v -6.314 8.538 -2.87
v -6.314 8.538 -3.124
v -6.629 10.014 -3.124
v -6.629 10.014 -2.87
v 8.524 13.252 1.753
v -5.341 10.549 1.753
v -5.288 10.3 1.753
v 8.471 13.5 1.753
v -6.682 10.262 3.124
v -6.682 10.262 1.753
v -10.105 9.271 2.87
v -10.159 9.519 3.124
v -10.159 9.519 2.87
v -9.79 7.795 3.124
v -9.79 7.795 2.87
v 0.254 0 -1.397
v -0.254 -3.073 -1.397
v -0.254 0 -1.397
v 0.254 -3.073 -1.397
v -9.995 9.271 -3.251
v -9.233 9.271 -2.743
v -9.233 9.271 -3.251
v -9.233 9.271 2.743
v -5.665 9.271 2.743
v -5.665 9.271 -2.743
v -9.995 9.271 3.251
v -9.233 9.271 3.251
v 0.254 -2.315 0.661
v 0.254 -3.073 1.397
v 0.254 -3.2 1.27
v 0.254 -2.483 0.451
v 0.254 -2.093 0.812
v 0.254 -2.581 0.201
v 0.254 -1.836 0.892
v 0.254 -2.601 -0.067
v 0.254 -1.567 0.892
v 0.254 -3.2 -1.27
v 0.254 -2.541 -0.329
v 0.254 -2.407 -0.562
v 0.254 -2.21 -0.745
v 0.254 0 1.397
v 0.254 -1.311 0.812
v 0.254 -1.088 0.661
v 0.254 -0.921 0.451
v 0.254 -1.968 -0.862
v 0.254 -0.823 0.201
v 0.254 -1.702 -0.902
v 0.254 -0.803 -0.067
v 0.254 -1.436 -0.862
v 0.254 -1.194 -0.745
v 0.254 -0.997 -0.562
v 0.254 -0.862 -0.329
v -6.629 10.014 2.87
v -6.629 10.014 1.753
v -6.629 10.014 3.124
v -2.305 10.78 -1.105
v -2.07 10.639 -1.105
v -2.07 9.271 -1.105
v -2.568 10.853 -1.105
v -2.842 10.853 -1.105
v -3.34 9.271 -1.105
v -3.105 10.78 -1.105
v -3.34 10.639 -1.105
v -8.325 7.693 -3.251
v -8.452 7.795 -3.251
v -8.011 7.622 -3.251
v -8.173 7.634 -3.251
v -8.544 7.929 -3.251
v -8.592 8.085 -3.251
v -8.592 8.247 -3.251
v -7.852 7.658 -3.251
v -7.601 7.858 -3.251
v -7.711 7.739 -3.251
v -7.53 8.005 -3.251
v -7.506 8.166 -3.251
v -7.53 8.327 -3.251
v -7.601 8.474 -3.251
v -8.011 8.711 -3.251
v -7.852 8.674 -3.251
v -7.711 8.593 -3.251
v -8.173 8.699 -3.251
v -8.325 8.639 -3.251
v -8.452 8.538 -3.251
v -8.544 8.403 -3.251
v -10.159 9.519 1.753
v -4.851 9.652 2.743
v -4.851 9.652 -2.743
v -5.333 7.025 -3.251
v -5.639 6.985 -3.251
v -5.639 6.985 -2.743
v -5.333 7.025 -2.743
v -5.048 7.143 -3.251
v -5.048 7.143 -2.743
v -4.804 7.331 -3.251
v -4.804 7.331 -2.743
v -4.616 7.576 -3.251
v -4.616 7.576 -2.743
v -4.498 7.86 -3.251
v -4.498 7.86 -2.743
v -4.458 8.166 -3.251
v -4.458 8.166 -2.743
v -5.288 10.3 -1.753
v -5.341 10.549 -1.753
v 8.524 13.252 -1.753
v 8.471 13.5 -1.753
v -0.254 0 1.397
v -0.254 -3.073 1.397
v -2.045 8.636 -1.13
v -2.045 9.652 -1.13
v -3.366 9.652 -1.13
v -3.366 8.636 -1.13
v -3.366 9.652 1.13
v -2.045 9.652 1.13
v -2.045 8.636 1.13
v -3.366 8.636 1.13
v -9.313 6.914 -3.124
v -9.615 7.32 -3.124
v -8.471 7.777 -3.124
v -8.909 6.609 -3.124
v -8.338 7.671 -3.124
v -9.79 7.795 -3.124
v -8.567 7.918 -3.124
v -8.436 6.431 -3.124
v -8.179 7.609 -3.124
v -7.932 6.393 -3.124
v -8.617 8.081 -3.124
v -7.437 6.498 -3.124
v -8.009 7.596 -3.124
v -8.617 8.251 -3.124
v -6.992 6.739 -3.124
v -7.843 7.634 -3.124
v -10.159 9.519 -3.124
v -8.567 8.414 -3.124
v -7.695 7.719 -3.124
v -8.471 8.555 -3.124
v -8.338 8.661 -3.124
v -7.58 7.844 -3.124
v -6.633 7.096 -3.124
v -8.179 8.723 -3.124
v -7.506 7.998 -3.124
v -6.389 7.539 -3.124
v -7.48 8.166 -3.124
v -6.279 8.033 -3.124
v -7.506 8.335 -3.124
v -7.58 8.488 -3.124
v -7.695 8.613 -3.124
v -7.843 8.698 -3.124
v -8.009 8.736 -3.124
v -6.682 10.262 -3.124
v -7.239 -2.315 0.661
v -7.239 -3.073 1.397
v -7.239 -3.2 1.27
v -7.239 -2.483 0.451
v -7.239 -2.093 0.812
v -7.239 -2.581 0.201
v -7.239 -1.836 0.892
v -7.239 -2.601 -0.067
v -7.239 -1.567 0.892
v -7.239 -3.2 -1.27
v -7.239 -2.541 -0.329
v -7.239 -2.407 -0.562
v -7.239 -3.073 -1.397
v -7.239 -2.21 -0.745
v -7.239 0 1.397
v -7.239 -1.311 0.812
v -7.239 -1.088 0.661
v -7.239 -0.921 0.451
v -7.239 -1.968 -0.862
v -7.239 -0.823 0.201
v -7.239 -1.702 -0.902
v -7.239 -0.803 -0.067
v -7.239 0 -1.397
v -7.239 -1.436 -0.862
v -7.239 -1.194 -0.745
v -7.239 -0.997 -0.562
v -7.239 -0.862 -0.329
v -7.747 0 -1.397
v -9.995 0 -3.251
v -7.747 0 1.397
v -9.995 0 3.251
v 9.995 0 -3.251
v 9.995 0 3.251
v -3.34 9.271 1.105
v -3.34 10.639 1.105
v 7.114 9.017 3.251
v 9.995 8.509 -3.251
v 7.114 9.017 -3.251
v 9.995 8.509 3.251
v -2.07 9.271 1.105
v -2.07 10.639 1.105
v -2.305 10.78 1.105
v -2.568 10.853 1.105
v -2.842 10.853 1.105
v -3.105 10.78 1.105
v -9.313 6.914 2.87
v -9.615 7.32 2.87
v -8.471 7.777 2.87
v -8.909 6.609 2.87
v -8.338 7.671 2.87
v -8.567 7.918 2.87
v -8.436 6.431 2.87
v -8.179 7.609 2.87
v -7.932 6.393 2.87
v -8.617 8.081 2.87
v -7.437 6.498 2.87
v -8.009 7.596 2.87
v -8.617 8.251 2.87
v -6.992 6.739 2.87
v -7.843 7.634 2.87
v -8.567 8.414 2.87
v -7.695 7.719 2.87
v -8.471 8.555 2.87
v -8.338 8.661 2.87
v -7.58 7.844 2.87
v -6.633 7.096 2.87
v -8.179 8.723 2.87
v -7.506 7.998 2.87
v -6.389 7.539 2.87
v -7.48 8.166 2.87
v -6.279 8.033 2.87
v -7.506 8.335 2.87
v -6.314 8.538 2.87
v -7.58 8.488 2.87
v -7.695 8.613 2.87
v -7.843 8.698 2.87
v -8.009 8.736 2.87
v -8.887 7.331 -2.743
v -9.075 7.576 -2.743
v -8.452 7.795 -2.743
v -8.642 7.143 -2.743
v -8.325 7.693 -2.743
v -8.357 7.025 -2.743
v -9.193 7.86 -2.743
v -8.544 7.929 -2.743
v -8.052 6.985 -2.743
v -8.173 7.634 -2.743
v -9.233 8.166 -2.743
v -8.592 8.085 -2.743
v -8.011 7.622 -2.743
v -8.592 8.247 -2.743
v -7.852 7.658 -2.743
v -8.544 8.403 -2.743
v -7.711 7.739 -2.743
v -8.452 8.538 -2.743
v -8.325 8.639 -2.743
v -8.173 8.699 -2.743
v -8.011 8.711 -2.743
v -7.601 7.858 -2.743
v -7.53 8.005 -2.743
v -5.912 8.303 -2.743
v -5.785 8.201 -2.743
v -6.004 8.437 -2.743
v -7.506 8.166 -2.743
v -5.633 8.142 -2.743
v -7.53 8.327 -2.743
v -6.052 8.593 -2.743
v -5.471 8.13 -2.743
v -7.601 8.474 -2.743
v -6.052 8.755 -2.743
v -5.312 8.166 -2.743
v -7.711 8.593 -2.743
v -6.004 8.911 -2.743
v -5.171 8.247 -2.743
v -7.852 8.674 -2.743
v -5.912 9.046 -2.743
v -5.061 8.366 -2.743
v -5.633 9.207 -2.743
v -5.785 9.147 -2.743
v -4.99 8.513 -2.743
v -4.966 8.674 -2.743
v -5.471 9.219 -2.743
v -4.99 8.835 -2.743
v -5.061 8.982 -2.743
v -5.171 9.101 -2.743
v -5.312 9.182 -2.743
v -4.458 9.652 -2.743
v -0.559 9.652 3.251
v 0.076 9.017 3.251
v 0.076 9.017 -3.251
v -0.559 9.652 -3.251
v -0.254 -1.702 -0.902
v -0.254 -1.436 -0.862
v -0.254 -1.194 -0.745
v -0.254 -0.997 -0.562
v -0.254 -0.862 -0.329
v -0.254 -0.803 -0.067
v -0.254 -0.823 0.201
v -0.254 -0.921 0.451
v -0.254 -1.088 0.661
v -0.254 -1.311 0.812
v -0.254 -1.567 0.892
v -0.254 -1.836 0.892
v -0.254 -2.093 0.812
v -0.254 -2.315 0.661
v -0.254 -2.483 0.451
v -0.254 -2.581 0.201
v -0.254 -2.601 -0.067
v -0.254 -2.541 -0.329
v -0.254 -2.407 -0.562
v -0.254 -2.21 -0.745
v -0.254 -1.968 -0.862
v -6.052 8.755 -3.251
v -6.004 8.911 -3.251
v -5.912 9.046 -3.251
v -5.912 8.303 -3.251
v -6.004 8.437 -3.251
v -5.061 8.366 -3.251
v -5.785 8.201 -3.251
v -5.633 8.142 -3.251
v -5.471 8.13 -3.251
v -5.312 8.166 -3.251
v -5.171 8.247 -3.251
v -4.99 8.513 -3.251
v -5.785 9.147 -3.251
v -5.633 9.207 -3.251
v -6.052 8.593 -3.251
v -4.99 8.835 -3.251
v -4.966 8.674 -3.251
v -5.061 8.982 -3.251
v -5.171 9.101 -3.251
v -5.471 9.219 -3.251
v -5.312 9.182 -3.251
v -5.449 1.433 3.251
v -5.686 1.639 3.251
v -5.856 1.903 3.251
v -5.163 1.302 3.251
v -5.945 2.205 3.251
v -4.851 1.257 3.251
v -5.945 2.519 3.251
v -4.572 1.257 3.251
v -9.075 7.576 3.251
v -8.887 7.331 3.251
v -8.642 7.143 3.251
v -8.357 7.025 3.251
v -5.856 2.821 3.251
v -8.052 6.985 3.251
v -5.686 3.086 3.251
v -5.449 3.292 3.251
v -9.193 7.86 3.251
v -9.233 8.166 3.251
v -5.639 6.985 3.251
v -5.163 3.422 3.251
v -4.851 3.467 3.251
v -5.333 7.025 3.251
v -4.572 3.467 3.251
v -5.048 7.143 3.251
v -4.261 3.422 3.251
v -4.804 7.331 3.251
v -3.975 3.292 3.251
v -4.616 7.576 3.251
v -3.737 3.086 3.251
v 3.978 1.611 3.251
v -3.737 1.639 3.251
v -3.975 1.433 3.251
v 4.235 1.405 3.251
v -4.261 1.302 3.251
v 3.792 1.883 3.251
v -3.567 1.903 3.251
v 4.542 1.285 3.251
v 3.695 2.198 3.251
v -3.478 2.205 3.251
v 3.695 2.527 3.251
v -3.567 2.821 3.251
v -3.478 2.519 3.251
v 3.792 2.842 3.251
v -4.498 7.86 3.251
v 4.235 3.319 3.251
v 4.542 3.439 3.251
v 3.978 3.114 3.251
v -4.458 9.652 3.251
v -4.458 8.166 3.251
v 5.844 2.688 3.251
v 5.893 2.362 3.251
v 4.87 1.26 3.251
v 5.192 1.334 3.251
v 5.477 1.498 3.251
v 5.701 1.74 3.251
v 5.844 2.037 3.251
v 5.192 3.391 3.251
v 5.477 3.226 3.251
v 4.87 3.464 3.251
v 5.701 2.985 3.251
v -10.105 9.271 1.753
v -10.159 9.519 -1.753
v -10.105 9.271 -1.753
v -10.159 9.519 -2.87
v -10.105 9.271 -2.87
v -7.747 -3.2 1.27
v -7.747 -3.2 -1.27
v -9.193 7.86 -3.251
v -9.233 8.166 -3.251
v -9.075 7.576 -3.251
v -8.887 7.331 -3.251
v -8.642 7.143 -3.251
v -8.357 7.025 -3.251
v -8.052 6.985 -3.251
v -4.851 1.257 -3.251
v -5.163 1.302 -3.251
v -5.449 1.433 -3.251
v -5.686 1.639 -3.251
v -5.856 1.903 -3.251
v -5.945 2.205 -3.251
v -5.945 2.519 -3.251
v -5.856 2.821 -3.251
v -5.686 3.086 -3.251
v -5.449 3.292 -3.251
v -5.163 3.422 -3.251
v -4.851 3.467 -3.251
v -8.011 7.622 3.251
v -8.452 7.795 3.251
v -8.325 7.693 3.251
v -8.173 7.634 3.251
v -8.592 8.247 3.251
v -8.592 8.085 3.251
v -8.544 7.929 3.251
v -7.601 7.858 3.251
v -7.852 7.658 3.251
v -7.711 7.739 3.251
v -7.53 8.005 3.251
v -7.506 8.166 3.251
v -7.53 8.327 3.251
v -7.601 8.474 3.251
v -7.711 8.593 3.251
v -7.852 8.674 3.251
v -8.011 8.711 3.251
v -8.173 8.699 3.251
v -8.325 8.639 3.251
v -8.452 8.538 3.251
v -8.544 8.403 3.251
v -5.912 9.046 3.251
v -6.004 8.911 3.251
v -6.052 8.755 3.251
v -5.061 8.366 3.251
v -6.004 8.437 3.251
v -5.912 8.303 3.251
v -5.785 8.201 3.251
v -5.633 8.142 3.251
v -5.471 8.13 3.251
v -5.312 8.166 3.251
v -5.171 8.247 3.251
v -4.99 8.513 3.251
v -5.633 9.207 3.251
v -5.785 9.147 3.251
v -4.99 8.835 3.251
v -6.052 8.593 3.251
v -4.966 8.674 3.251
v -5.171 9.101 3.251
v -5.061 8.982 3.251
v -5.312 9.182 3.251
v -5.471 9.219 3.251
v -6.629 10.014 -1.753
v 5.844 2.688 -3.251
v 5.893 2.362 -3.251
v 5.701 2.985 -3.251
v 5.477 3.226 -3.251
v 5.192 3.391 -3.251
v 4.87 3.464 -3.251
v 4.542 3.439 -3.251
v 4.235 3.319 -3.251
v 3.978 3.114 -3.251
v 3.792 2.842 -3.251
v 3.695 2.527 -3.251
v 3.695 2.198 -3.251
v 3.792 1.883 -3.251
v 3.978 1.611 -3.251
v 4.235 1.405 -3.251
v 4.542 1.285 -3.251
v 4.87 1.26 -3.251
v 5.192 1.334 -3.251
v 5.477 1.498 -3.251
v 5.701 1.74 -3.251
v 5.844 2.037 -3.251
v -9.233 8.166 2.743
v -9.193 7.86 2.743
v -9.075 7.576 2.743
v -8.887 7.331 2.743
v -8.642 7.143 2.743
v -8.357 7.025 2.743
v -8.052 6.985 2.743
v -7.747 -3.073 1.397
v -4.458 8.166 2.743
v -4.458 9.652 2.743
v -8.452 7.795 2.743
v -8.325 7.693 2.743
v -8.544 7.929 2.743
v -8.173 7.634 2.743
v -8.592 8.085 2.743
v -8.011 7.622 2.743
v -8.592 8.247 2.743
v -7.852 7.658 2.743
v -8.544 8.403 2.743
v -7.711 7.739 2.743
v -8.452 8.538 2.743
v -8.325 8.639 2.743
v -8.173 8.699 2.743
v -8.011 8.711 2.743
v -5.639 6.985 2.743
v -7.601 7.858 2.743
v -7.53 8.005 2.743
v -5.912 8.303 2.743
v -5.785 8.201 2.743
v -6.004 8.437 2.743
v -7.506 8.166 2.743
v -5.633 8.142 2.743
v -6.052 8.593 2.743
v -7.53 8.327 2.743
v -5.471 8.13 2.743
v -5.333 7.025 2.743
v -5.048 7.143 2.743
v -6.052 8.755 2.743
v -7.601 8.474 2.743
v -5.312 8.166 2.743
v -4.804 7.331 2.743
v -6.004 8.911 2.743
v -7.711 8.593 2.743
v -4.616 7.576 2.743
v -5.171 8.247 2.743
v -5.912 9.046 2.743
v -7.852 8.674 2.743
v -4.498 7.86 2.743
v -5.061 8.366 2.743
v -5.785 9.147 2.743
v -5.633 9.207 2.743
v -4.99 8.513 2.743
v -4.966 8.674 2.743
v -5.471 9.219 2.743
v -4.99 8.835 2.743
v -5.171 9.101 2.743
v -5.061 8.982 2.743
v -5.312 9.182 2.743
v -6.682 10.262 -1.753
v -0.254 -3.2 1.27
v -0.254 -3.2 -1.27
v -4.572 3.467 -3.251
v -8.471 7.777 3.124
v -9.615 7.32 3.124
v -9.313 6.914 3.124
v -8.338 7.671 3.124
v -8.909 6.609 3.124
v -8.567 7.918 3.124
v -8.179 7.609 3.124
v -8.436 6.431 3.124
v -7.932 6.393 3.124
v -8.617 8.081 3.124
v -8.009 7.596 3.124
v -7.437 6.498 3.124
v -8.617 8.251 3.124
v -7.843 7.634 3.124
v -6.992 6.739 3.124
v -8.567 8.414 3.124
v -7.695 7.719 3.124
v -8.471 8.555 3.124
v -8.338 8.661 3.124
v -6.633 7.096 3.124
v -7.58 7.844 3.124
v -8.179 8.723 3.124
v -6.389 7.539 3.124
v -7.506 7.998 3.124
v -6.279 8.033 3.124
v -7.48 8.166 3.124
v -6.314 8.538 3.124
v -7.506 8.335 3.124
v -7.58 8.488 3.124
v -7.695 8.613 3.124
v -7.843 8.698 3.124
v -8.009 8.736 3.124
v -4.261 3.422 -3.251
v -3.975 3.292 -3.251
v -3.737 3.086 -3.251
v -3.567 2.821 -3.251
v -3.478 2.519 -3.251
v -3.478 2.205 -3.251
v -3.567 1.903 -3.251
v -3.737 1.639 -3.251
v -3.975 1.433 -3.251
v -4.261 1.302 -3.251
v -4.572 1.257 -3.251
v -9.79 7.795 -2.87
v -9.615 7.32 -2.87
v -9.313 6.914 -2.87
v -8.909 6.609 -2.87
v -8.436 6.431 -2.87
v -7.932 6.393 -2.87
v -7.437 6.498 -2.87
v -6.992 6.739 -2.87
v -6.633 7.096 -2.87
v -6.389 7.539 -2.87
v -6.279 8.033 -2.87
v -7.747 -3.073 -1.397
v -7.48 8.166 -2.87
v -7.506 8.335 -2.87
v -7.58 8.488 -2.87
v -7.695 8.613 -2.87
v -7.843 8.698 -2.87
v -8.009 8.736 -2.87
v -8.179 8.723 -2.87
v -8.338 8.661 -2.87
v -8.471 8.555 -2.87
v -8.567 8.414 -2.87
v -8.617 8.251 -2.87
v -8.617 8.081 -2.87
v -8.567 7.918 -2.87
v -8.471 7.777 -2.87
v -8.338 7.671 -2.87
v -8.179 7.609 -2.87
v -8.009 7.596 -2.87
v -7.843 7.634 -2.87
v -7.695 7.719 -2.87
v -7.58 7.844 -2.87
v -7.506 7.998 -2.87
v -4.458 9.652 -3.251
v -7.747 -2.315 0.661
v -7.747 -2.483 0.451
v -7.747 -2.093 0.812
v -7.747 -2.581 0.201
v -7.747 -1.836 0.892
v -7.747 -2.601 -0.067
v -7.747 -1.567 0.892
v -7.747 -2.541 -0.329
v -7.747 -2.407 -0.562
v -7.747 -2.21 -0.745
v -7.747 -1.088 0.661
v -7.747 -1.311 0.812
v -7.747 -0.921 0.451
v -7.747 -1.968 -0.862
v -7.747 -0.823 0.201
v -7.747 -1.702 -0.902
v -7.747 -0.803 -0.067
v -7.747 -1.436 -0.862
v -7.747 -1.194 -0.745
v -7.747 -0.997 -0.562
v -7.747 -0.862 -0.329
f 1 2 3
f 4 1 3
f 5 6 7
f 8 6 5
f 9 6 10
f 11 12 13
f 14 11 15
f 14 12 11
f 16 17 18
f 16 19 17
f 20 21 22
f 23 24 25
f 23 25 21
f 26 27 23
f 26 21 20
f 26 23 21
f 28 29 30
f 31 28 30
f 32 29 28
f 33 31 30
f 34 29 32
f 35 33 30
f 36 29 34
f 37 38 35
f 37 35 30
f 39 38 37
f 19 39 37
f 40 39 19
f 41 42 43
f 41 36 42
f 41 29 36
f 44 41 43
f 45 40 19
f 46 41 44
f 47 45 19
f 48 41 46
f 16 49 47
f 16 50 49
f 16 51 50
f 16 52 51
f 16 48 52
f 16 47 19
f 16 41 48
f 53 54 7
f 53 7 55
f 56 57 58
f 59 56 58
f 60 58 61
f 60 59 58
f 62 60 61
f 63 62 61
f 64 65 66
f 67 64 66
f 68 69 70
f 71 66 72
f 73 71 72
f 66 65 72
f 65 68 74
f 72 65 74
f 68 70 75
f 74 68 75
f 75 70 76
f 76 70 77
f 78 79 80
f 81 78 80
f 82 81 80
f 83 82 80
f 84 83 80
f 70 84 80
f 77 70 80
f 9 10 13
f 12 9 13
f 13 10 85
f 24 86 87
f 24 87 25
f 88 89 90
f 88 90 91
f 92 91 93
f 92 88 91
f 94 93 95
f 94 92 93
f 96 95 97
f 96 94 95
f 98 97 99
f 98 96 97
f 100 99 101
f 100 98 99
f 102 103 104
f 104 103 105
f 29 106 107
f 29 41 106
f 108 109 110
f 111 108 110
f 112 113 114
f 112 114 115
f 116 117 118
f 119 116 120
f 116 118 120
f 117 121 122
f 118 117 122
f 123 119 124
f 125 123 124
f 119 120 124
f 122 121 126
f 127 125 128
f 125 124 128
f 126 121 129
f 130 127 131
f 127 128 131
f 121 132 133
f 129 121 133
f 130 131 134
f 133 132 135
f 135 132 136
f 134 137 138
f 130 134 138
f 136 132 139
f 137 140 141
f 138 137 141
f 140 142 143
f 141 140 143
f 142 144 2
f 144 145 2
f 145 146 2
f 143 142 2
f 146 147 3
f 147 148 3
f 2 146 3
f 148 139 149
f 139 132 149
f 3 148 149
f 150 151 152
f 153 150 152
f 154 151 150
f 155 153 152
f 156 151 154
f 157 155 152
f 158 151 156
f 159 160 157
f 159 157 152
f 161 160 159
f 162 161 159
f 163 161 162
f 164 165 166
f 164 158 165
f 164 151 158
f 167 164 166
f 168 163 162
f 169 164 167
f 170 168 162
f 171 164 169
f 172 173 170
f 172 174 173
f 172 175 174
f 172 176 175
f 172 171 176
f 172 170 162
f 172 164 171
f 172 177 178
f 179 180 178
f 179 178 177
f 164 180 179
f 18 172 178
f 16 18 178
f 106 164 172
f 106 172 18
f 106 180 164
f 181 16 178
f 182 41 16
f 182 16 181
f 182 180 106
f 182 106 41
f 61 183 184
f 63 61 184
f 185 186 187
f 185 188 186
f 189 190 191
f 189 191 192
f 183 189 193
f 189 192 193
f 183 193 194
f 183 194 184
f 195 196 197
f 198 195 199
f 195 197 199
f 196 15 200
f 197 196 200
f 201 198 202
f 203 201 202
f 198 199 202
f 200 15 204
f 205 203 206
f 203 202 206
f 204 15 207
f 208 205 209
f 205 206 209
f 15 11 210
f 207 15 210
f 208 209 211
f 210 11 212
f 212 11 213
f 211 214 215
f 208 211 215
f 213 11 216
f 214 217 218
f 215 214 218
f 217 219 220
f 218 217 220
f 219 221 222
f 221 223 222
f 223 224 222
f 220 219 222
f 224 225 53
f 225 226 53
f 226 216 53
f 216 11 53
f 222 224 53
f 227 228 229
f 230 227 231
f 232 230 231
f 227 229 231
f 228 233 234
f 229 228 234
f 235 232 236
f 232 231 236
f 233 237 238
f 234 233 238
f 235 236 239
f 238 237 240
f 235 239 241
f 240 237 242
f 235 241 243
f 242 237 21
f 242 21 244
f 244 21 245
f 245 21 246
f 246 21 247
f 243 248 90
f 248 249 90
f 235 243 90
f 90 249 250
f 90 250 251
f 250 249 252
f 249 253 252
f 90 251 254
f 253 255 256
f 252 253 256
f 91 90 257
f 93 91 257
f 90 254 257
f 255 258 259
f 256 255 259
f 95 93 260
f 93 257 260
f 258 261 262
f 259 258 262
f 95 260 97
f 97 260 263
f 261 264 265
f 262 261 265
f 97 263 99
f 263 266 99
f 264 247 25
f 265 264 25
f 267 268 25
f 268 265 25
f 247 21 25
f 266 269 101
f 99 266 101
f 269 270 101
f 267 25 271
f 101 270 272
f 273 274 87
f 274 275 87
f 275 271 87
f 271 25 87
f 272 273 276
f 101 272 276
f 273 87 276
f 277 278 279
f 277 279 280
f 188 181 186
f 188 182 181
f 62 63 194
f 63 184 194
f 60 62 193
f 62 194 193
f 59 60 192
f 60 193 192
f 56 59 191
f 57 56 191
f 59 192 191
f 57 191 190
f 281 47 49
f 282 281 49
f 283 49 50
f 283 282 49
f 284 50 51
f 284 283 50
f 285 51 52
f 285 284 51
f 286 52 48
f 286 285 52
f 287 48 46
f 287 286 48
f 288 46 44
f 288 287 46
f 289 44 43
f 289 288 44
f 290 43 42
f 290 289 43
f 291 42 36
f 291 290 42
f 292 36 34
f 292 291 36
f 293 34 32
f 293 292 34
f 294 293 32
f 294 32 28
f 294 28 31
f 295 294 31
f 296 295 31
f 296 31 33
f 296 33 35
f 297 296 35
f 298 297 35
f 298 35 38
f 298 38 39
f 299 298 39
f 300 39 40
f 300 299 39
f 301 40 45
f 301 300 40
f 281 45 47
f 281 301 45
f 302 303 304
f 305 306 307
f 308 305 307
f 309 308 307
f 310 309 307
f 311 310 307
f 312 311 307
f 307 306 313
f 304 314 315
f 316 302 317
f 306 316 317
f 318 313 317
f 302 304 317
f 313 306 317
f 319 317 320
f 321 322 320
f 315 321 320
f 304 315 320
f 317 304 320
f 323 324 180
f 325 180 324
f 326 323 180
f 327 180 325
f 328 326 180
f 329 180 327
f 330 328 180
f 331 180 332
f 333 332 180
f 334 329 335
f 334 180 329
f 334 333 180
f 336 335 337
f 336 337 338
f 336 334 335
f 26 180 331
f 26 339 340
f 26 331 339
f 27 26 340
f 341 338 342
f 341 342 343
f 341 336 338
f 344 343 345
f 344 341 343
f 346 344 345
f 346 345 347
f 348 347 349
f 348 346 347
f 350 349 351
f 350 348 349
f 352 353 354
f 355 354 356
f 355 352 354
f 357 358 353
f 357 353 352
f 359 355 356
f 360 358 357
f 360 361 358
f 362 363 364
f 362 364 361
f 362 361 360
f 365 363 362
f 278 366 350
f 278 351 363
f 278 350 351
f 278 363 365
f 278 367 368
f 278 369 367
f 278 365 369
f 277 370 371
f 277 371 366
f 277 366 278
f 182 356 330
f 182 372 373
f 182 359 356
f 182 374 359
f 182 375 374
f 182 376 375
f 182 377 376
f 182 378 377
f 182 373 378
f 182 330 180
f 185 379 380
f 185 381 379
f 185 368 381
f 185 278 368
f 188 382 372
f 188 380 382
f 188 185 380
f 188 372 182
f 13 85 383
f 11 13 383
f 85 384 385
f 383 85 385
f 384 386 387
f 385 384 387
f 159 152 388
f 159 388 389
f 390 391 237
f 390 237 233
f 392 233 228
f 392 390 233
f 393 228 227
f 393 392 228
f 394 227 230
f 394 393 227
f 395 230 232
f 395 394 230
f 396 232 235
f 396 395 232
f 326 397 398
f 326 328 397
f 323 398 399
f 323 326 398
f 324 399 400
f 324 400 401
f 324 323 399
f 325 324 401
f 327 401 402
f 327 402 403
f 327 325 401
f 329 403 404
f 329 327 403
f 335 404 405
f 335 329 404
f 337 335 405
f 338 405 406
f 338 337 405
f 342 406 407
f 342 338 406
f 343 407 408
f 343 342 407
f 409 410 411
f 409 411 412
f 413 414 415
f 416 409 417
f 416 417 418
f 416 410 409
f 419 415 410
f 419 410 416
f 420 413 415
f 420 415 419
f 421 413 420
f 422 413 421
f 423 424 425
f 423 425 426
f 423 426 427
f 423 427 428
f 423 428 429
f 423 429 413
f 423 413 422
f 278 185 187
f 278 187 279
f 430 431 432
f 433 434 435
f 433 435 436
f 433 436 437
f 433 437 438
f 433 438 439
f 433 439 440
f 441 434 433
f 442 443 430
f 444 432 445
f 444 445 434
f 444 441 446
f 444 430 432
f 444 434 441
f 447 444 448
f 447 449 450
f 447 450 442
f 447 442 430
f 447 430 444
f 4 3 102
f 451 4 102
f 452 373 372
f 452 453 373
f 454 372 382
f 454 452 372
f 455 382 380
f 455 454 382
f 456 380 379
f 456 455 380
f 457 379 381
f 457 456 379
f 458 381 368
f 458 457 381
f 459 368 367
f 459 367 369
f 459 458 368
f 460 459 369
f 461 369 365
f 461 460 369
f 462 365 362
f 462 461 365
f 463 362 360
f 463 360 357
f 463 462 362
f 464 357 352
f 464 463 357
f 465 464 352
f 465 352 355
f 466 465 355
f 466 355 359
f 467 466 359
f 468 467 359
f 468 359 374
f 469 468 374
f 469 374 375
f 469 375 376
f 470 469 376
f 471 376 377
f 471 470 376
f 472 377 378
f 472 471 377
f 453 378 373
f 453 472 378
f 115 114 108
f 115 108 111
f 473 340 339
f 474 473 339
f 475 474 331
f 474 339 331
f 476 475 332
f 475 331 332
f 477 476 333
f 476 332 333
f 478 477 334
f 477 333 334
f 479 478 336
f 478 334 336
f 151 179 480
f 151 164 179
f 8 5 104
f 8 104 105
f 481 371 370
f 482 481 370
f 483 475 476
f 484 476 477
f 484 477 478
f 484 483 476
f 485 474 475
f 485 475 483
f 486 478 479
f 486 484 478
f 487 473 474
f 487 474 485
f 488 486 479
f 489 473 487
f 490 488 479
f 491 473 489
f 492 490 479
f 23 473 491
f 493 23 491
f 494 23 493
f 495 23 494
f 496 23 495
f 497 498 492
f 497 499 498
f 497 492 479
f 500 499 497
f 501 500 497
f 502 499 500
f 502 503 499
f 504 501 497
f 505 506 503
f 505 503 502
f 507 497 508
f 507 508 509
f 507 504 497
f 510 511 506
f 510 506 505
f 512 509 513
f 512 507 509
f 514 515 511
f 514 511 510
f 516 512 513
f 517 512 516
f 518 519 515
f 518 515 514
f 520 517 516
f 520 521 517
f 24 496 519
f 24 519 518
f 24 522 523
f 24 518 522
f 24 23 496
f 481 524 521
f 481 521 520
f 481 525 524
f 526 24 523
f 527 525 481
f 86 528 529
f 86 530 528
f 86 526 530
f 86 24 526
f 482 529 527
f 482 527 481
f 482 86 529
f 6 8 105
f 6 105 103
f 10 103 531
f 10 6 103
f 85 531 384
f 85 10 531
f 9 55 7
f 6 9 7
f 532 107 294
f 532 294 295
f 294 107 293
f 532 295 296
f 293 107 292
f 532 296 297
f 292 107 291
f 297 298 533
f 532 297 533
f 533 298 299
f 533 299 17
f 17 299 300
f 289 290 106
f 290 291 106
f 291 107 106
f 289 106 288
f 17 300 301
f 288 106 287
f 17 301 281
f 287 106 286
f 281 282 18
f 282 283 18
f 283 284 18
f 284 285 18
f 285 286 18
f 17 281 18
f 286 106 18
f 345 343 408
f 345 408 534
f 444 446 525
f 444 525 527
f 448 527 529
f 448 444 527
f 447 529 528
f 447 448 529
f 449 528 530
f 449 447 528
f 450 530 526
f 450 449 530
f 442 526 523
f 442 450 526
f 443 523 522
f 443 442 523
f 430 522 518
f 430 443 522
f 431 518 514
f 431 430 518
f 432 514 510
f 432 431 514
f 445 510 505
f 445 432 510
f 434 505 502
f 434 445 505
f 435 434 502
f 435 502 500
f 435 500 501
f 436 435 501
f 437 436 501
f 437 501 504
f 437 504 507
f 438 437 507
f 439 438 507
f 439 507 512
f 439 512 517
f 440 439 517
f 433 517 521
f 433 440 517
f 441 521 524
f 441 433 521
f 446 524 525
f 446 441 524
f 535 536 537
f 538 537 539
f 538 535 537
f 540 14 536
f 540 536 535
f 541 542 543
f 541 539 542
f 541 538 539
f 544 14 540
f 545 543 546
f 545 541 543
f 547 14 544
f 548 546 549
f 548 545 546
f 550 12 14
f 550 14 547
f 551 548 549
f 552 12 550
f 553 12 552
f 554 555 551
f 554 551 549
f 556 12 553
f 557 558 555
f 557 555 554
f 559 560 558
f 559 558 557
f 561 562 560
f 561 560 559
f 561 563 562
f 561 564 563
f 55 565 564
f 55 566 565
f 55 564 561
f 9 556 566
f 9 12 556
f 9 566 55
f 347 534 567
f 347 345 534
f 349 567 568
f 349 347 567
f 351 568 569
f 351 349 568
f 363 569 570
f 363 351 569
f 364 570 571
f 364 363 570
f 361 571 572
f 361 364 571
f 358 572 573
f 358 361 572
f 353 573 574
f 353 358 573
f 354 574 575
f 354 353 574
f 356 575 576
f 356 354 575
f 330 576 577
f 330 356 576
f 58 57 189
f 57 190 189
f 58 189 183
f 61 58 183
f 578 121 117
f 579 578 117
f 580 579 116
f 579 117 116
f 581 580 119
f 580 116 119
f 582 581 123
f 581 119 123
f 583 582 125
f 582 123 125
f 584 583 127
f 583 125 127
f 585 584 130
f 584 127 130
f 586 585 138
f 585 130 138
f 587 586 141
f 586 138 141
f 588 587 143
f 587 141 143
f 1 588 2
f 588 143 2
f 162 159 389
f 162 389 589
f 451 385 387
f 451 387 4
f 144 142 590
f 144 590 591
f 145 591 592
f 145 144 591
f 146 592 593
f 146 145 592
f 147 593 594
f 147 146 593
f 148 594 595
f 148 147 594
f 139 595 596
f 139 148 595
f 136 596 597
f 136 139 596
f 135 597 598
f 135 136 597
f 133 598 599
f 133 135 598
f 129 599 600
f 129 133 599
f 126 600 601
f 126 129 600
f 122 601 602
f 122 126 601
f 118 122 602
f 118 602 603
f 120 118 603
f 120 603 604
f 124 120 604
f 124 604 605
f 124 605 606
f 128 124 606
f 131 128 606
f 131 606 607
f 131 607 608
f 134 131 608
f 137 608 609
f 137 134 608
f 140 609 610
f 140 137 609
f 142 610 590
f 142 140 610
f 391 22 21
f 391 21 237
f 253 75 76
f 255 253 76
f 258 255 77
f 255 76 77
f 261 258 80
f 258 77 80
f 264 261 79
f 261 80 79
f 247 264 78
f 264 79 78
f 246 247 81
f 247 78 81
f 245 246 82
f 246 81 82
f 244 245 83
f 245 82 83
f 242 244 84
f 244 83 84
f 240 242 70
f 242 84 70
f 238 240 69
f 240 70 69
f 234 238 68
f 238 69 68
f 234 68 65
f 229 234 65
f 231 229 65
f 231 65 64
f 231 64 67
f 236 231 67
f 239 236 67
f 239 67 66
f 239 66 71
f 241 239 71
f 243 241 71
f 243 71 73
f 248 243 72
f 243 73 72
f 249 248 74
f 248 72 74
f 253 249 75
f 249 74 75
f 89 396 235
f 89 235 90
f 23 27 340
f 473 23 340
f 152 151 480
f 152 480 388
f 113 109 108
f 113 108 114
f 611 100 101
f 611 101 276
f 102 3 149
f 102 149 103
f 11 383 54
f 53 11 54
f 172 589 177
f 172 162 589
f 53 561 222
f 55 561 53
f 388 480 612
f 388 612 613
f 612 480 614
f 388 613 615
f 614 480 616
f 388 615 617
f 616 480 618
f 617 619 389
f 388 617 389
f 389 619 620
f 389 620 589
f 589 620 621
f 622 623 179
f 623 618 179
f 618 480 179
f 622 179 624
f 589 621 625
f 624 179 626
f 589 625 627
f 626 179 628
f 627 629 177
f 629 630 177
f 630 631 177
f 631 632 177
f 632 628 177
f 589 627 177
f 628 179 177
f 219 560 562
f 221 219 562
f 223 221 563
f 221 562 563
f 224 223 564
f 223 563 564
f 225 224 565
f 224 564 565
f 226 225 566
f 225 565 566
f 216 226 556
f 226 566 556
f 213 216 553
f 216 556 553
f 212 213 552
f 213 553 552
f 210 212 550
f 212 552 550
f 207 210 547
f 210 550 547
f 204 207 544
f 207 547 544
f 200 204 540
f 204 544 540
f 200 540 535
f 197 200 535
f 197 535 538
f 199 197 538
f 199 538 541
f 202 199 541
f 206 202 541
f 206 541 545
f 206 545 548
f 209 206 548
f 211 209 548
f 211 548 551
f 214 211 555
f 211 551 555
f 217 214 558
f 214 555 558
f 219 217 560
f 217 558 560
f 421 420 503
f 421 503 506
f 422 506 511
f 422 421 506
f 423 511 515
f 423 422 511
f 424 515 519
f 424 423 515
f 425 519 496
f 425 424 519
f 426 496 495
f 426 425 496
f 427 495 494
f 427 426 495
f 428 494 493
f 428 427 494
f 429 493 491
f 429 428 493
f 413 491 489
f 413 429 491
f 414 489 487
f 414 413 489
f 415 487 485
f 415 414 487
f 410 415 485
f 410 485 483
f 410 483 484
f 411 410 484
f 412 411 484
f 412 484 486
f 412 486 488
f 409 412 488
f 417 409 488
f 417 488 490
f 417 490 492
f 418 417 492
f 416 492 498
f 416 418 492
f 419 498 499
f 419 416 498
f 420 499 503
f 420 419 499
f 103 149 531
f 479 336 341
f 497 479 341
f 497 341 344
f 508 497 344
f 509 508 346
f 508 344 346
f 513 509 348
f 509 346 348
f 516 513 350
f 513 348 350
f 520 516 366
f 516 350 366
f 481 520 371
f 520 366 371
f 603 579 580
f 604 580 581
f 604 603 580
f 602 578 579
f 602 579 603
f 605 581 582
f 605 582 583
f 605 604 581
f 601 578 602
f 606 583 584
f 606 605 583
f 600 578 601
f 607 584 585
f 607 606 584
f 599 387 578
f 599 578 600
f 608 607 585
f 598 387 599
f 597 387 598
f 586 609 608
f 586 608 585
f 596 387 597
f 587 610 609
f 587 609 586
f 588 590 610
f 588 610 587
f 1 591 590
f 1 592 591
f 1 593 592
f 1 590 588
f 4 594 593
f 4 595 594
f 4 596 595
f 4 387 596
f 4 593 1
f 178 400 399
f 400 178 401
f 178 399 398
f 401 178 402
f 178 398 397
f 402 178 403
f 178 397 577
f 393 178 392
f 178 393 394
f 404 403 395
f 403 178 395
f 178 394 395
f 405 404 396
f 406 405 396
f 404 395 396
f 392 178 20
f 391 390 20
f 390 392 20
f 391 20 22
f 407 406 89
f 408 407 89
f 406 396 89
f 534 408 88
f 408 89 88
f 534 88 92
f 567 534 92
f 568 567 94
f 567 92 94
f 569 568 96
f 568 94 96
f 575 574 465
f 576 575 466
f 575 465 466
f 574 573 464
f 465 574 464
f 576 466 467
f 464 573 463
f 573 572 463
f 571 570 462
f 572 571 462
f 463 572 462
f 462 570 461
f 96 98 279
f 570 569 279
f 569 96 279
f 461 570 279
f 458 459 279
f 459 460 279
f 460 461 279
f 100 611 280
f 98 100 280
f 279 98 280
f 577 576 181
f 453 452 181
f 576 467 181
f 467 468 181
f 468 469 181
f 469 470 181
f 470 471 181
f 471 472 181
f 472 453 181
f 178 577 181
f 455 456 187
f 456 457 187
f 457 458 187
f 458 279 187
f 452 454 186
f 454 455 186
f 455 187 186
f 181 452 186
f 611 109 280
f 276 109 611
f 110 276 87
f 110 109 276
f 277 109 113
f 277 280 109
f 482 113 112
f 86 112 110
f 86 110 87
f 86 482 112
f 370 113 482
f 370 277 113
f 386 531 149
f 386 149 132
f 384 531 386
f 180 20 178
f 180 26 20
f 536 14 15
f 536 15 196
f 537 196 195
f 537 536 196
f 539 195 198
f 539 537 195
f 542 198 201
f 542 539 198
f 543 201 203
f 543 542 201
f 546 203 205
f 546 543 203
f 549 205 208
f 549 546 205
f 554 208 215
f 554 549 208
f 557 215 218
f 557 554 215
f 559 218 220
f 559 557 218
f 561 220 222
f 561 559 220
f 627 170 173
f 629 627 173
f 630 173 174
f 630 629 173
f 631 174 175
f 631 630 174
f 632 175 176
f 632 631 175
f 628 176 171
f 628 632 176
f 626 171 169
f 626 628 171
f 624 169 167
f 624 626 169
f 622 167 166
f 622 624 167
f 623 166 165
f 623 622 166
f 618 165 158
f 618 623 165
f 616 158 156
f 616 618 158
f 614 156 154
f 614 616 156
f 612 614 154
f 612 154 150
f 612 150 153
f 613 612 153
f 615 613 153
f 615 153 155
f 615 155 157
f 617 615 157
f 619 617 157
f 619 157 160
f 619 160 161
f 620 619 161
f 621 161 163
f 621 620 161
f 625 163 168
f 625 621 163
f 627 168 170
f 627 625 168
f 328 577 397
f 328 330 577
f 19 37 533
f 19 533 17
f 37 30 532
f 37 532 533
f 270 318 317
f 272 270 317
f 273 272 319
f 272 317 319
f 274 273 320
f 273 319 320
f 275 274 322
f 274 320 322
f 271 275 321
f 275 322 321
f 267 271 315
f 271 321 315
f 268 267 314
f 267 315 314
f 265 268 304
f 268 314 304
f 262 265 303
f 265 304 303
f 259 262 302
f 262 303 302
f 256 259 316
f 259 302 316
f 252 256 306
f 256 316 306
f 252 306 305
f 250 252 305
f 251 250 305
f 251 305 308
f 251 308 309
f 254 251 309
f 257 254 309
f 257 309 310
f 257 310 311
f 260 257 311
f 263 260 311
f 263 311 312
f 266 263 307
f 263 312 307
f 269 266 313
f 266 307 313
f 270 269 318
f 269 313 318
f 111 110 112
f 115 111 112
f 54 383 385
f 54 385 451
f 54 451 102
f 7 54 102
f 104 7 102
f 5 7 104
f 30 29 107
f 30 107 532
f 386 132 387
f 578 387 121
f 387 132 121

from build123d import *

# Parameters (mm, degrees)
SKETCH2_R          = 1.1049
EXTRUDE1_DEPTH     = 3.2512
EXTRUDE2_DEPTH     = 1.1049
SKETCH4_W          = 1.3208
SKETCH4_H          = 2.2606
CUT_EXTRUDE1_DEPTH = 1.016
SKETCH5_R          = 0.5461
CUT_EXTRUDE2_DEPTH = 0.508
SKETCH10_R         = 0.9017
EXTRUDE6_DEPTH     = 0.254
LPATTERN1_COUNT    = 2
LPATTERN1_PITCH    = 7.493
EXTRUDE3_DEPTH     = 1.7526
EXTRUDE4_START     = -0.127
SKETCH8_R          = 0.5715
EXTRUDE4_DEPTH     = 0.254
EXTRUDE5_DEPTH     = 1.1176


with BuildPart() as part:
    # Sketch2 → Extrude1 (new, symmetric)
    with BuildSketch(Plane.XY):
        Polygon((9.9949, 8.509), (7.113888836, 9.017), (0.0762, 9.017), (-0.5588, 9.652), (-4.8514, 9.652), (-5.664596778, 9.271), (-9.9949, 9.271), (-9.9949, 0), (9.9949, 0), align=None)
        with Locations((4.7879, 2.3622)):
            Circle(SKETCH2_R, mode=Mode.SUBTRACT)
        with BuildLine():
            Line((-4.8514, 3.4671), (-4.572, 3.4671))
            ThreePointArc((-4.572, 3.4671), (-3.4671, 2.3622), (-4.572, 1.2573))
            Line((-4.572, 1.2573), (-4.8514, 1.2573))
            ThreePointArc((-4.8514, 1.2573), (-5.9563, 2.3622), (-4.8514, 3.4671))
        make_face(mode=Mode.SUBTRACT)
    extrude(amount=EXTRUDE1_DEPTH, both=True)

    # Sketch4 → Cut-Extrude1 (cut)
    with BuildSketch(Plane(origin=(0, 9.652, 0), x_dir=(-1, 0, 0), z_dir=(0, 1, 0))):
        with Locations((2.7051, 0)):
            Rectangle(SKETCH4_W, SKETCH4_H)
    extrude(amount=-CUT_EXTRUDE1_DEPTH, mode=Mode.SUBTRACT)

    # Sketch5 → Cut-Extrude2 (cut)
    with BuildSketch(Plane.XY.offset(3.2512)):
        with BuildLine():
            Line((-9.2329, 9.271), (-9.2329, 8.1661))
            ThreePointArc((-9.2329, 8.1661), (-8.886963819, 7.330936181), (-8.0518, 6.985))
            Line((-8.0518, 6.985), (-5.6388, 6.985))
            ThreePointArc((-5.6388, 6.985), (-4.803636181, 7.330936181), (-4.4577, 8.1661))
            Line((-4.4577, 8.1661), (-4.4577, 9.652))
            Line((-4.4577, 9.652), (-4.8514, 9.652))
            Line((-4.8514, 9.652), (-5.664596778, 9.271))
            Line((-5.664596778, 9.271), (-9.2329, 9.271))
        make_face()
        with Locations((-5.5118, 8.6741)):
            Circle(SKETCH5_R, mode=Mode.SUBTRACT)
        with Locations((-8.0518, 8.1661)):
            Circle(SKETCH5_R, mode=Mode.SUBTRACT)
    cut_extrude2 = extrude(amount=-CUT_EXTRUDE2_DEPTH, mode=Mode.SUBTRACT)

    # Mirror1: Cut-Extrude2 across plane
    add(cut_extrude2.mirror(Plane.XY), mode=Mode.SUBTRACT)

    # Sketch10 → Extrude6 (add, symmetric)
    with BuildSketch(Plane(origin=(-7.493, 0, 0), x_dir=(0, 0, -1), z_dir=(1, 0, 0))):
        Polygon((-1.397, 0), (-1.397, -3.0734), (-1.27, -3.2004), (1.27, -3.2004), (1.397, -3.0734), (1.397, 0), align=None)
        with Locations((0, -1.7018)):
            Circle(SKETCH10_R, mode=Mode.SUBTRACT)
    extrude6 = extrude(amount=EXTRUDE6_DEPTH, both=True)

    # LPattern1: Extrude6 ×2
    with Locations(*[(i * LPATTERN1_PITCH, 0, 0) for i in range(1, LPATTERN1_COUNT)]):
        add(extrude6)


with BuildPart() as body_2:
    # Sketch3 → Extrude2 (new, symmetric)
    with BuildSketch(Plane.XY):
        with BuildLine():
            Line((-3.3401, 9.271), (-3.3401, 10.639314746))
            ThreePointArc((-3.3401, 10.639314746), (-2.7051, 10.8622), (-2.0701, 10.639314746))
            Line((-2.0701, 10.639314746), (-2.0701, 9.271))
            Line((-2.0701, 9.271), (-3.3401, 9.271))
        make_face()
    extrude(amount=EXTRUDE2_DEPTH, both=True)


with BuildPart() as body_3:
    # Sketch6 → Extrude3 (new, symmetric)
    with BuildSketch(Plane.XY):
        Polygon((-10.105498332, 9.271), (8.52397476, 13.251607025), (8.4709, 13.5), (-10.158573093, 9.519392975), align=None)
    extrude(amount=EXTRUDE3_DEPTH, both=True)


with BuildPart() as body_4:
    # Sketch8 → Extrude4 (new body)
    with BuildSketch(Plane.XY.offset(3.2512).offset(EXTRUDE4_START)):
        with BuildLine():
            Line((-6.313549941, 8.537516323), (-6.682072975, 10.262225621))
            Line((-6.682072975, 10.262225621), (-10.158573093, 9.519392975))
            Line((-10.158573093, 9.519392975), (-9.790050059, 7.794683677))
            ThreePointArc((-9.790050059, 7.794683677), (-7.680383677, 6.427849941), (-6.313549941, 8.537516323))
        make_face()
        with Locations((-8.0518, 8.1661)):
            Circle(SKETCH8_R, mode=Mode.SUBTRACT)
    extrude(amount=-EXTRUDE4_DEPTH)

    # Sketch9 → Extrude5 (add)
    with BuildSketch(Plane.XY.offset(1.7526)):
        Polygon((-6.628998215, 10.013832646), (-6.682072975, 10.262225621), (-10.158573093, 9.519392975), (-10.105498332, 9.271), align=None)
    extrude(amount=EXTRUDE5_DEPTH)


with BuildPart() as body_5:
    # Mirror7: mirrored copy
    add(body_4.part.mirror(Plane.XY))

    # Combine1: union body 3, body 4
    add(body_3.part)
    add(body_4.part)

    # Chamfer1
    # the kernel refuses this chamfer: 1.3716 mm, written as the material it adds along each edge
    with BuildSketch(Plane(origin=(-6.628998215, 10.013832646, -1.7526), x_dir=(-0.02688890779397689, -0.005745421501653921, -0.9996219169112968), z_dir=(-0.20895574936649164, 0.9779250967260673, 0))) as chamfer1_piece_1_section:
        with BuildLine():
            Line((1.410928155, 0), (-0.077560078, -1.408794766))
            Line((-0.077560078, -1.408794766), (-0.104981706, -1.408040499))
            ThreePointArc((-0.104981706, -1.408040499), (-0.046811648, -0.704176463), (-0.027421628, 0.000754267))
            Line((-0.027421628, 0.000754267), (0.000754267, 0.027421628))
            ThreePointArc((0.000754267, 0.027421628), (0.705684997, 0.008031609), (1.411682421, 0.027421628))
            Line((1.411682421, 0.027421628), (1.410928155, 0))
        make_face()
    chamfer1_piece_1 = extrude(amount=0.254, mode=Mode.PRIVATE)
    chamfer1_piece_1 = split(chamfer1_piece_1, bisect_by=Plane(origin=(-6.605283049, 10.148766723, -2.8702), z_dir=(0, 0, -1)), keep=Keep.TOP, mode=Mode.PRIVATE)
    chamfer1_piece_1 = split(chamfer1_piece_1, bisect_by=Plane(origin=(-6.605283049, 10.148766723, -3.1242), z_dir=(0, 0, 1)), keep=Keep.TOP, mode=Mode.PRIVATE)
    add(chamfer1_piece_1)
    with BuildSketch(Plane(origin=(-5.891944341, 6.564377516, -1.7526), x_dir=(-0.026888907793975552, -0.005745421501653636, -0.9996219169112968), z_dir=(-0.20895574936649164, 0.9779250967260673, 0))) as chamfer1_piece_2_section:
        with BuildLine():
            Line((1.410928155, 0), (-0.077560078, -1.408794766))
            Line((-0.077560078, -1.408794766), (-0.104981706, -1.408040499))
            ThreePointArc((-0.104981706, -1.408040499), (-0.046811648, -0.704176463), (-0.027421628, 0.000754267))
            Line((-0.027421628, 0.000754267), (0.000754267, 0.027421628))
            ThreePointArc((0.000754267, 0.027421628), (0.705684997, 0.008031609), (1.411682421, 0.027421628))
            Line((1.411682421, 0.027421628), (1.410928155, 0))
        make_face()
    chamfer1_piece_2 = extrude(amount=3.781320386, mode=Mode.PRIVATE)
    chamfer1_piece_2 = split(chamfer1_piece_2, bisect_by=Plane(origin=(-6.345522767, 8.530684608, -2.8702), z_dir=(0, 0, -1)), keep=Keep.TOP, mode=Mode.PRIVATE)
    chamfer1_piece_2 = split(chamfer1_piece_2, bisect_by=Plane(origin=(-6.345522767, 8.530684608, -3.1242), z_dir=(0, 0, 1)), keep=Keep.TOP, mode=Mode.PRIVATE)
    chamfer1_piece_2 = chamfer1_piece_2 & Plane(origin=(-8.0518, 8.1661, -3.007575957), x_dir=(-0.9779250967260683, -0.20895574936648695, 0), z_dir=(0, 0, -1)) * Cylinder(1.777487933, 14, mode=Mode.PRIVATE)
    add(chamfer1_piece_2)
    with BuildSketch(Plane(origin=(-6.628998215, 10.013832646, -1.7526), x_dir=(-0.02688890779397689, -0.005745421501653921, -0.9996219169112968), z_dir=(-0.20895574936649164, 0.9779250967260673, 0))) as chamfer1_piece_3_section:
        with BuildLine():
            Line((1.410928155, 0), (-0.077560078, -1.408794766))
            Line((-0.077560078, -1.408794766), (-0.104981706, -1.408040499))
            ThreePointArc((-0.104981706, -1.408040499), (-0.046811648, -0.704176463), (-0.027421628, 0.000754267))
            Line((-0.027421628, 0.000754267), (0.000754267, 0.027421628))
            ThreePointArc((0.000754267, 0.027421628), (0.705684997, 0.008031609), (1.411682421, 0.027421628))
            Line((1.411682421, 0.027421628), (1.410928155, 0))
        make_face()
    chamfer1_piece_3 = extrude(amount=0.254, mode=Mode.PRIVATE)
    chamfer1_piece_3 = split(chamfer1_piece_3, bisect_by=Plane(origin=(-6.194081793, 10.236629144, -2.8702), z_dir=(0, 0, 1)), keep=Keep.TOP, mode=Mode.PRIVATE)
    add(chamfer1_piece_3)
    with BuildSketch(Plane(origin=(-6.628998215, 10.013832646, 1.7526), x_dir=(-0.02688890779397689, -0.005745421501653921, 0.9996219169112968), z_dir=(-0.2089557493664916, 0.9779250967260672, 0))) as chamfer1_piece_4_section:
        with BuildLine():
            Line((1.410928155, 0), (-0.077560078, 1.408794766))
            Line((-0.077560078, 1.408794766), (-0.104981706, 1.408040499))
            ThreePointArc((-0.104981706, 1.408040499), (-0.046811648, 0.704176463), (-0.027421628, -0.000754267))
            Line((-0.027421628, -0.000754267), (0.000754267, -0.027421628))
            ThreePointArc((0.000754267, -0.027421628), (0.705684997, -0.008031609), (1.411682421, -0.027421628))
            Line((1.411682421, -0.027421628), (1.410928155, 0))
        make_face()
    chamfer1_piece_4 = extrude(amount=0.254, mode=Mode.PRIVATE)
    chamfer1_piece_4 = split(chamfer1_piece_4, bisect_by=Plane(origin=(-6.605283049, 10.148766723, 2.8702), z_dir=(0, 0, 1)), keep=Keep.TOP, mode=Mode.PRIVATE)
    chamfer1_piece_4 = split(chamfer1_piece_4, bisect_by=Plane(origin=(-6.605283049, 10.148766723, 3.1242), z_dir=(0, 0, -1)), keep=Keep.TOP, mode=Mode.PRIVATE)
    add(chamfer1_piece_4)
    with BuildSketch(Plane(origin=(-5.891944341, 6.564377516, 1.7526), x_dir=(-0.026888907793975552, -0.005745421501653634, 0.9996219169112968), z_dir=(-0.2089557493664916, 0.9779250967260672, 0))) as chamfer1_piece_5_section:
        with BuildLine():
            Line((1.410928155, 0), (-0.077560078, 1.408794766))
            Line((-0.077560078, 1.408794766), (-0.104981706, 1.408040499))
            ThreePointArc((-0.104981706, 1.408040499), (-0.046811648, 0.704176463), (-0.027421628, -0.000754267))
            Line((-0.027421628, -0.000754267), (0.000754267, -0.027421628))
            ThreePointArc((0.000754267, -0.027421628), (0.705684997, -0.008031609), (1.411682421, -0.027421628))
            Line((1.411682421, -0.027421628), (1.410928155, 0))
        make_face()
    chamfer1_piece_5 = extrude(amount=3.781320386, mode=Mode.PRIVATE)
    chamfer1_piece_5 = split(chamfer1_piece_5, bisect_by=Plane(origin=(-6.345522767, 8.530684608, 2.8702), z_dir=(0, 0, 1)), keep=Keep.TOP, mode=Mode.PRIVATE)
    chamfer1_piece_5 = chamfer1_piece_5 & Plane(origin=(-8.0518, 8.1661, 3.007575957), x_dir=(-0.9779250967260683, -0.20895574936648695, 0), z_dir=(0, 0, 1)) * Cylinder(1.777487933, 14, mode=Mode.PRIVATE)
    chamfer1_piece_5 = split(chamfer1_piece_5, bisect_by=Plane(origin=(-6.345522767, 8.530684608, 3.1242), z_dir=(0, 0, -1)), keep=Keep.TOP, mode=Mode.PRIVATE)
    add(chamfer1_piece_5)
    with BuildSketch(Plane(origin=(-6.628998215, 10.013832646, 1.7526), x_dir=(-0.02688890779397689, -0.005745421501653921, 0.9996219169112968), z_dir=(-0.2089557493664916, 0.9779250967260672, 0))) as chamfer1_piece_6_section:
        with BuildLine():
            Line((1.410928155, 0), (-0.077560078, 1.408794766))
            Line((-0.077560078, 1.408794766), (-0.104981706, 1.408040499))
            ThreePointArc((-0.104981706, 1.408040499), (-0.046811648, 0.704176463), (-0.027421628, -0.000754267))
            Line((-0.027421628, -0.000754267), (0.000754267, -0.027421628))
            ThreePointArc((0.000754267, -0.027421628), (0.705684997, -0.008031609), (1.411682421, -0.027421628))
            Line((1.411682421, -0.027421628), (1.410928155, 0))
        make_face()
    chamfer1_piece_6 = extrude(amount=0.254, mode=Mode.PRIVATE)
    chamfer1_piece_6 = split(chamfer1_piece_6, bisect_by=Plane(origin=(-6.194081793, 10.236629144, 2.8702), z_dir=(0, 0, -1)), keep=Keep.TOP, mode=Mode.PRIVATE)
    add(chamfer1_piece_6)


solid = Compound([part.part, body_2.part, body_5.part])
